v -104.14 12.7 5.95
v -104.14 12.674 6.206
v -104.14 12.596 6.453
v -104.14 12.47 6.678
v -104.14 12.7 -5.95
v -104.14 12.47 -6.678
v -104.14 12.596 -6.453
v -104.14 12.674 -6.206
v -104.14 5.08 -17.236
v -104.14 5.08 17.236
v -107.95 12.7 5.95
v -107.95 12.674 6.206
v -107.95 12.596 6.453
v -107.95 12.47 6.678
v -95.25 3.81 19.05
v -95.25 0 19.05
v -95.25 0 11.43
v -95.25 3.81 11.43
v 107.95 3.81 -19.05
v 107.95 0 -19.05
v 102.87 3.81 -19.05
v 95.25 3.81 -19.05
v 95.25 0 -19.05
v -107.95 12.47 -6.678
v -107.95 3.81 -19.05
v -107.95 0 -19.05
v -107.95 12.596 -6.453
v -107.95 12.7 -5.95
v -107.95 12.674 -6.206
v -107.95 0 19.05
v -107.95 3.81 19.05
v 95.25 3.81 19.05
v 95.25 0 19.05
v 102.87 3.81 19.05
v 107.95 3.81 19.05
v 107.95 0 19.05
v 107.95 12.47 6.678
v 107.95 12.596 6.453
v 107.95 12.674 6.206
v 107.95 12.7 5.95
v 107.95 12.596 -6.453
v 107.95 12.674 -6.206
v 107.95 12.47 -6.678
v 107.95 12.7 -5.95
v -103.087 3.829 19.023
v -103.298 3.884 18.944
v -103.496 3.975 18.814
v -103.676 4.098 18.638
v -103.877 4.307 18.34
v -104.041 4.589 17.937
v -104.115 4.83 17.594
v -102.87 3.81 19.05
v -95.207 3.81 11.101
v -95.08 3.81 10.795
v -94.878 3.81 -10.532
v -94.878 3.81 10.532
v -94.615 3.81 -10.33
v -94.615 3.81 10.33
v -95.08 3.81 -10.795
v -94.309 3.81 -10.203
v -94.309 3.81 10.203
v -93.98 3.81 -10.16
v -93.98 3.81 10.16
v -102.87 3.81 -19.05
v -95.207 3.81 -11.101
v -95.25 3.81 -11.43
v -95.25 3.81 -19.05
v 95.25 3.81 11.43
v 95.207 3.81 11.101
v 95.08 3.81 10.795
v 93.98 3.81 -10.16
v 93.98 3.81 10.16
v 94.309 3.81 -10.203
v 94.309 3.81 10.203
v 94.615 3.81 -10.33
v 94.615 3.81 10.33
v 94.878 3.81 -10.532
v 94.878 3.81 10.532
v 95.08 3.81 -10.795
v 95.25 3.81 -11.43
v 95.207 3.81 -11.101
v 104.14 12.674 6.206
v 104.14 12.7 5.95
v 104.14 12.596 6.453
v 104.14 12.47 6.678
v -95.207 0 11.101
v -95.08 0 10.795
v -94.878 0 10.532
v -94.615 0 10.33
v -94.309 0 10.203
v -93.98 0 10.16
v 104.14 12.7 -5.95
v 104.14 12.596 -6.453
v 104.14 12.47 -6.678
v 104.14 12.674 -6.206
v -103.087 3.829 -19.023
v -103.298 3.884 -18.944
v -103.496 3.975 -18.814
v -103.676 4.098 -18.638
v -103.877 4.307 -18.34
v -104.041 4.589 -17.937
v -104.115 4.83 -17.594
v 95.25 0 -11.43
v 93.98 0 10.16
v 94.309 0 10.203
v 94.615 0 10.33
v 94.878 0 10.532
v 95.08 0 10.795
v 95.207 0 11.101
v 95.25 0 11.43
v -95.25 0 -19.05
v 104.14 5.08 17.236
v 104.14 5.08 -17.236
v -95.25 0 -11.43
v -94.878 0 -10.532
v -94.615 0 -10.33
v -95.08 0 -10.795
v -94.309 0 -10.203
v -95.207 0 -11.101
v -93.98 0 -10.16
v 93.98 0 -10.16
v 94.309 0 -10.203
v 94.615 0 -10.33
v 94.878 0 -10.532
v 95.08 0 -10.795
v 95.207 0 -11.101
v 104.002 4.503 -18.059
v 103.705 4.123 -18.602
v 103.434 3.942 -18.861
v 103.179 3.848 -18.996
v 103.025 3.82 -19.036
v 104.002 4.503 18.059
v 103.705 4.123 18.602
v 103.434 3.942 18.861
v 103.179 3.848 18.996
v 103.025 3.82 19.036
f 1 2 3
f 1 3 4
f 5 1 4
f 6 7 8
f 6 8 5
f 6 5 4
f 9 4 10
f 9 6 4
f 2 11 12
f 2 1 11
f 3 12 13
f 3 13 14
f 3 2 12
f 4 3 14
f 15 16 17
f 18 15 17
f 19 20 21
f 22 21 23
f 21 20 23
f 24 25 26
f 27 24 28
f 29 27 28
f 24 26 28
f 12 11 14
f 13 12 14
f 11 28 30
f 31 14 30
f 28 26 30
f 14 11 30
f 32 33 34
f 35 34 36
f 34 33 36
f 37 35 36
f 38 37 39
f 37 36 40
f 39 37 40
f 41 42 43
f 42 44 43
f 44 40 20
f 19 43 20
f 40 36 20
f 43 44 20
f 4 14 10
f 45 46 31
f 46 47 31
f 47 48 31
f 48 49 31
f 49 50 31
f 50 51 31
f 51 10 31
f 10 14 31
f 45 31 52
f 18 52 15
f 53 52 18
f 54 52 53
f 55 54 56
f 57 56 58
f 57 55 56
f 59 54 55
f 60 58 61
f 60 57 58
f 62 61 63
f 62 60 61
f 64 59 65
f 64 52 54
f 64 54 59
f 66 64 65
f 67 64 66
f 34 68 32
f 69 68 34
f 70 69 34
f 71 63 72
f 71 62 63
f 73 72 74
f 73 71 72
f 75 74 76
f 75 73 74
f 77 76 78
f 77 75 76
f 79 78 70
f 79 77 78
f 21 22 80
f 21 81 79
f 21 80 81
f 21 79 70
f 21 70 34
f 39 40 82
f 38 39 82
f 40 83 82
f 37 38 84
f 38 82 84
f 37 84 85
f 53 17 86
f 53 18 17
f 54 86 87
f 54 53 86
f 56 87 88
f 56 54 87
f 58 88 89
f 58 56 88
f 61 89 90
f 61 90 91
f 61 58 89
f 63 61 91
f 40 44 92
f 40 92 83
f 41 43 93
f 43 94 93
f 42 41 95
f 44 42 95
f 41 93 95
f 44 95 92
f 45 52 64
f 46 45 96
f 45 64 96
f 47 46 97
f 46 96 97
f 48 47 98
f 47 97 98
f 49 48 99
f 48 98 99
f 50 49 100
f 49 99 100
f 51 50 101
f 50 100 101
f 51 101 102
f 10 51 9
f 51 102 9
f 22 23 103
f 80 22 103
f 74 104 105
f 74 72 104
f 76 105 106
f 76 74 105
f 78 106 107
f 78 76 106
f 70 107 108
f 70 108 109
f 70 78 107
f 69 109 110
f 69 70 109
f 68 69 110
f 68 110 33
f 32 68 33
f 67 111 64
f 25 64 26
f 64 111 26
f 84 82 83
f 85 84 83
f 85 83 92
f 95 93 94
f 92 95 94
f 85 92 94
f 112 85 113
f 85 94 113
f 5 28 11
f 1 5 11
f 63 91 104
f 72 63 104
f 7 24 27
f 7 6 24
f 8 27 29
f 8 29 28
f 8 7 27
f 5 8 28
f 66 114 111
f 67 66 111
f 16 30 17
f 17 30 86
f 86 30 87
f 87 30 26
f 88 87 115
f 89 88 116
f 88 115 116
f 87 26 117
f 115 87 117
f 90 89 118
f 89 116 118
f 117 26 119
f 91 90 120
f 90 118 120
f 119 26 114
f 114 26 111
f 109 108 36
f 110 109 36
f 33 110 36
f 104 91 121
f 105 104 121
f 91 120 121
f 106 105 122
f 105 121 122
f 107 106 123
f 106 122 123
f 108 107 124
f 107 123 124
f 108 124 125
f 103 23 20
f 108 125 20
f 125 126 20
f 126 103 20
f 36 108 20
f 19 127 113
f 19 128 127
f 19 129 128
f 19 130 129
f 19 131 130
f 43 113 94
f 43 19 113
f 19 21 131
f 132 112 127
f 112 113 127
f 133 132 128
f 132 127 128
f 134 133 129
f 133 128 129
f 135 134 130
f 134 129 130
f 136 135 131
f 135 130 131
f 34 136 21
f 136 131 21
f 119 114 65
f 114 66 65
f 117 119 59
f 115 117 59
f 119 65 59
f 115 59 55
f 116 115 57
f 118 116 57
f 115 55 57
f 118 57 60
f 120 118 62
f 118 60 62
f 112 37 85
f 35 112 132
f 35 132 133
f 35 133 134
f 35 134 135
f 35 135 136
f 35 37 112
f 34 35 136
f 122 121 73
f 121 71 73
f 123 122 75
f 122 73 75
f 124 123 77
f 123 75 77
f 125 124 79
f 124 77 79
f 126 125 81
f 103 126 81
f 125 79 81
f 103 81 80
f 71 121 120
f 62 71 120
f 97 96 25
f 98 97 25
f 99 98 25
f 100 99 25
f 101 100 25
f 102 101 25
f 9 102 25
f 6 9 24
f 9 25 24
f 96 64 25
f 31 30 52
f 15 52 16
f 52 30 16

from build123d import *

# Parameters (mm, degrees)
BOSS_EXTRUDE1_DEPTH = 3.81
BOSS_EXTRUDE2_DEPTH = 3.81
FILLET1_R           = 1.27
FILLET2_R           = 1.27


with BuildPart() as part:
    # Sketch1 → Boss-Extrude1 (new body)
    with BuildSketch(Plane(origin=(0, 0, 0), x_dir=(1, 0, 0), z_dir=(0, 1, 0))):
        Polygon((95.25, 10.16), (-95.25, 10.16), (-95.25, 19.05), (-107.95, 19.05), (-107.95, -19.05), (-95.25, -19.05), (-95.25, -10.16), (95.25, -10.16), (95.25, -19.05), (107.95, -19.05), (107.95, 19.05), (95.25, 19.05), align=None)
    extrude(amount=BOSS_EXTRUDE1_DEPTH)

    # Sketch2 → Boss-Extrude2 (add)
    with BuildSketch(Plane.ZY.offset(107.95)):
        Polygon((-19.05, 0), (-19.05, 3.81), (-6.35, 12.7), (6.35, 12.7), (19.05, 3.81), (19.05, 0), align=None)
    boss_extrude2 = extrude(amount=-BOSS_EXTRUDE2_DEPTH)

    # Mirror1: Boss-Extrude2 across plane
    add(boss_extrude2.mirror(Plane(origin=(0, 0, 0), x_dir=(0, 0, 1), z_dir=(1, 0, 0))))

    # Fillet1
    fillet1_edges = [part.edges().sort_by_distance(p)[0] for p in [
        (-104.14, 3.81, 0),
        (-106.045, 12.7, -6.35),
        (-106.045, 12.7, 6.35),
        (104.14, 3.81, 0),
        (106.045, 12.7, 6.35),
        (106.045, 12.7, -6.35),
    ]]
    fillet(fillet1_edges, radius=FILLET1_R)

    # Fillet2
    fillet2_edges = [part.edges().sort_by_distance(p)[0] for p in [
        (-95.25, 1.905, -10.16),
        (95.25, 1.905, -10.16),
        (95.25, 1.905, 10.16),
        (-95.25, 1.905, 10.16),
    ]]
    fillet(fillet2_edges, radius=FILLET2_R)


solid = part.part
